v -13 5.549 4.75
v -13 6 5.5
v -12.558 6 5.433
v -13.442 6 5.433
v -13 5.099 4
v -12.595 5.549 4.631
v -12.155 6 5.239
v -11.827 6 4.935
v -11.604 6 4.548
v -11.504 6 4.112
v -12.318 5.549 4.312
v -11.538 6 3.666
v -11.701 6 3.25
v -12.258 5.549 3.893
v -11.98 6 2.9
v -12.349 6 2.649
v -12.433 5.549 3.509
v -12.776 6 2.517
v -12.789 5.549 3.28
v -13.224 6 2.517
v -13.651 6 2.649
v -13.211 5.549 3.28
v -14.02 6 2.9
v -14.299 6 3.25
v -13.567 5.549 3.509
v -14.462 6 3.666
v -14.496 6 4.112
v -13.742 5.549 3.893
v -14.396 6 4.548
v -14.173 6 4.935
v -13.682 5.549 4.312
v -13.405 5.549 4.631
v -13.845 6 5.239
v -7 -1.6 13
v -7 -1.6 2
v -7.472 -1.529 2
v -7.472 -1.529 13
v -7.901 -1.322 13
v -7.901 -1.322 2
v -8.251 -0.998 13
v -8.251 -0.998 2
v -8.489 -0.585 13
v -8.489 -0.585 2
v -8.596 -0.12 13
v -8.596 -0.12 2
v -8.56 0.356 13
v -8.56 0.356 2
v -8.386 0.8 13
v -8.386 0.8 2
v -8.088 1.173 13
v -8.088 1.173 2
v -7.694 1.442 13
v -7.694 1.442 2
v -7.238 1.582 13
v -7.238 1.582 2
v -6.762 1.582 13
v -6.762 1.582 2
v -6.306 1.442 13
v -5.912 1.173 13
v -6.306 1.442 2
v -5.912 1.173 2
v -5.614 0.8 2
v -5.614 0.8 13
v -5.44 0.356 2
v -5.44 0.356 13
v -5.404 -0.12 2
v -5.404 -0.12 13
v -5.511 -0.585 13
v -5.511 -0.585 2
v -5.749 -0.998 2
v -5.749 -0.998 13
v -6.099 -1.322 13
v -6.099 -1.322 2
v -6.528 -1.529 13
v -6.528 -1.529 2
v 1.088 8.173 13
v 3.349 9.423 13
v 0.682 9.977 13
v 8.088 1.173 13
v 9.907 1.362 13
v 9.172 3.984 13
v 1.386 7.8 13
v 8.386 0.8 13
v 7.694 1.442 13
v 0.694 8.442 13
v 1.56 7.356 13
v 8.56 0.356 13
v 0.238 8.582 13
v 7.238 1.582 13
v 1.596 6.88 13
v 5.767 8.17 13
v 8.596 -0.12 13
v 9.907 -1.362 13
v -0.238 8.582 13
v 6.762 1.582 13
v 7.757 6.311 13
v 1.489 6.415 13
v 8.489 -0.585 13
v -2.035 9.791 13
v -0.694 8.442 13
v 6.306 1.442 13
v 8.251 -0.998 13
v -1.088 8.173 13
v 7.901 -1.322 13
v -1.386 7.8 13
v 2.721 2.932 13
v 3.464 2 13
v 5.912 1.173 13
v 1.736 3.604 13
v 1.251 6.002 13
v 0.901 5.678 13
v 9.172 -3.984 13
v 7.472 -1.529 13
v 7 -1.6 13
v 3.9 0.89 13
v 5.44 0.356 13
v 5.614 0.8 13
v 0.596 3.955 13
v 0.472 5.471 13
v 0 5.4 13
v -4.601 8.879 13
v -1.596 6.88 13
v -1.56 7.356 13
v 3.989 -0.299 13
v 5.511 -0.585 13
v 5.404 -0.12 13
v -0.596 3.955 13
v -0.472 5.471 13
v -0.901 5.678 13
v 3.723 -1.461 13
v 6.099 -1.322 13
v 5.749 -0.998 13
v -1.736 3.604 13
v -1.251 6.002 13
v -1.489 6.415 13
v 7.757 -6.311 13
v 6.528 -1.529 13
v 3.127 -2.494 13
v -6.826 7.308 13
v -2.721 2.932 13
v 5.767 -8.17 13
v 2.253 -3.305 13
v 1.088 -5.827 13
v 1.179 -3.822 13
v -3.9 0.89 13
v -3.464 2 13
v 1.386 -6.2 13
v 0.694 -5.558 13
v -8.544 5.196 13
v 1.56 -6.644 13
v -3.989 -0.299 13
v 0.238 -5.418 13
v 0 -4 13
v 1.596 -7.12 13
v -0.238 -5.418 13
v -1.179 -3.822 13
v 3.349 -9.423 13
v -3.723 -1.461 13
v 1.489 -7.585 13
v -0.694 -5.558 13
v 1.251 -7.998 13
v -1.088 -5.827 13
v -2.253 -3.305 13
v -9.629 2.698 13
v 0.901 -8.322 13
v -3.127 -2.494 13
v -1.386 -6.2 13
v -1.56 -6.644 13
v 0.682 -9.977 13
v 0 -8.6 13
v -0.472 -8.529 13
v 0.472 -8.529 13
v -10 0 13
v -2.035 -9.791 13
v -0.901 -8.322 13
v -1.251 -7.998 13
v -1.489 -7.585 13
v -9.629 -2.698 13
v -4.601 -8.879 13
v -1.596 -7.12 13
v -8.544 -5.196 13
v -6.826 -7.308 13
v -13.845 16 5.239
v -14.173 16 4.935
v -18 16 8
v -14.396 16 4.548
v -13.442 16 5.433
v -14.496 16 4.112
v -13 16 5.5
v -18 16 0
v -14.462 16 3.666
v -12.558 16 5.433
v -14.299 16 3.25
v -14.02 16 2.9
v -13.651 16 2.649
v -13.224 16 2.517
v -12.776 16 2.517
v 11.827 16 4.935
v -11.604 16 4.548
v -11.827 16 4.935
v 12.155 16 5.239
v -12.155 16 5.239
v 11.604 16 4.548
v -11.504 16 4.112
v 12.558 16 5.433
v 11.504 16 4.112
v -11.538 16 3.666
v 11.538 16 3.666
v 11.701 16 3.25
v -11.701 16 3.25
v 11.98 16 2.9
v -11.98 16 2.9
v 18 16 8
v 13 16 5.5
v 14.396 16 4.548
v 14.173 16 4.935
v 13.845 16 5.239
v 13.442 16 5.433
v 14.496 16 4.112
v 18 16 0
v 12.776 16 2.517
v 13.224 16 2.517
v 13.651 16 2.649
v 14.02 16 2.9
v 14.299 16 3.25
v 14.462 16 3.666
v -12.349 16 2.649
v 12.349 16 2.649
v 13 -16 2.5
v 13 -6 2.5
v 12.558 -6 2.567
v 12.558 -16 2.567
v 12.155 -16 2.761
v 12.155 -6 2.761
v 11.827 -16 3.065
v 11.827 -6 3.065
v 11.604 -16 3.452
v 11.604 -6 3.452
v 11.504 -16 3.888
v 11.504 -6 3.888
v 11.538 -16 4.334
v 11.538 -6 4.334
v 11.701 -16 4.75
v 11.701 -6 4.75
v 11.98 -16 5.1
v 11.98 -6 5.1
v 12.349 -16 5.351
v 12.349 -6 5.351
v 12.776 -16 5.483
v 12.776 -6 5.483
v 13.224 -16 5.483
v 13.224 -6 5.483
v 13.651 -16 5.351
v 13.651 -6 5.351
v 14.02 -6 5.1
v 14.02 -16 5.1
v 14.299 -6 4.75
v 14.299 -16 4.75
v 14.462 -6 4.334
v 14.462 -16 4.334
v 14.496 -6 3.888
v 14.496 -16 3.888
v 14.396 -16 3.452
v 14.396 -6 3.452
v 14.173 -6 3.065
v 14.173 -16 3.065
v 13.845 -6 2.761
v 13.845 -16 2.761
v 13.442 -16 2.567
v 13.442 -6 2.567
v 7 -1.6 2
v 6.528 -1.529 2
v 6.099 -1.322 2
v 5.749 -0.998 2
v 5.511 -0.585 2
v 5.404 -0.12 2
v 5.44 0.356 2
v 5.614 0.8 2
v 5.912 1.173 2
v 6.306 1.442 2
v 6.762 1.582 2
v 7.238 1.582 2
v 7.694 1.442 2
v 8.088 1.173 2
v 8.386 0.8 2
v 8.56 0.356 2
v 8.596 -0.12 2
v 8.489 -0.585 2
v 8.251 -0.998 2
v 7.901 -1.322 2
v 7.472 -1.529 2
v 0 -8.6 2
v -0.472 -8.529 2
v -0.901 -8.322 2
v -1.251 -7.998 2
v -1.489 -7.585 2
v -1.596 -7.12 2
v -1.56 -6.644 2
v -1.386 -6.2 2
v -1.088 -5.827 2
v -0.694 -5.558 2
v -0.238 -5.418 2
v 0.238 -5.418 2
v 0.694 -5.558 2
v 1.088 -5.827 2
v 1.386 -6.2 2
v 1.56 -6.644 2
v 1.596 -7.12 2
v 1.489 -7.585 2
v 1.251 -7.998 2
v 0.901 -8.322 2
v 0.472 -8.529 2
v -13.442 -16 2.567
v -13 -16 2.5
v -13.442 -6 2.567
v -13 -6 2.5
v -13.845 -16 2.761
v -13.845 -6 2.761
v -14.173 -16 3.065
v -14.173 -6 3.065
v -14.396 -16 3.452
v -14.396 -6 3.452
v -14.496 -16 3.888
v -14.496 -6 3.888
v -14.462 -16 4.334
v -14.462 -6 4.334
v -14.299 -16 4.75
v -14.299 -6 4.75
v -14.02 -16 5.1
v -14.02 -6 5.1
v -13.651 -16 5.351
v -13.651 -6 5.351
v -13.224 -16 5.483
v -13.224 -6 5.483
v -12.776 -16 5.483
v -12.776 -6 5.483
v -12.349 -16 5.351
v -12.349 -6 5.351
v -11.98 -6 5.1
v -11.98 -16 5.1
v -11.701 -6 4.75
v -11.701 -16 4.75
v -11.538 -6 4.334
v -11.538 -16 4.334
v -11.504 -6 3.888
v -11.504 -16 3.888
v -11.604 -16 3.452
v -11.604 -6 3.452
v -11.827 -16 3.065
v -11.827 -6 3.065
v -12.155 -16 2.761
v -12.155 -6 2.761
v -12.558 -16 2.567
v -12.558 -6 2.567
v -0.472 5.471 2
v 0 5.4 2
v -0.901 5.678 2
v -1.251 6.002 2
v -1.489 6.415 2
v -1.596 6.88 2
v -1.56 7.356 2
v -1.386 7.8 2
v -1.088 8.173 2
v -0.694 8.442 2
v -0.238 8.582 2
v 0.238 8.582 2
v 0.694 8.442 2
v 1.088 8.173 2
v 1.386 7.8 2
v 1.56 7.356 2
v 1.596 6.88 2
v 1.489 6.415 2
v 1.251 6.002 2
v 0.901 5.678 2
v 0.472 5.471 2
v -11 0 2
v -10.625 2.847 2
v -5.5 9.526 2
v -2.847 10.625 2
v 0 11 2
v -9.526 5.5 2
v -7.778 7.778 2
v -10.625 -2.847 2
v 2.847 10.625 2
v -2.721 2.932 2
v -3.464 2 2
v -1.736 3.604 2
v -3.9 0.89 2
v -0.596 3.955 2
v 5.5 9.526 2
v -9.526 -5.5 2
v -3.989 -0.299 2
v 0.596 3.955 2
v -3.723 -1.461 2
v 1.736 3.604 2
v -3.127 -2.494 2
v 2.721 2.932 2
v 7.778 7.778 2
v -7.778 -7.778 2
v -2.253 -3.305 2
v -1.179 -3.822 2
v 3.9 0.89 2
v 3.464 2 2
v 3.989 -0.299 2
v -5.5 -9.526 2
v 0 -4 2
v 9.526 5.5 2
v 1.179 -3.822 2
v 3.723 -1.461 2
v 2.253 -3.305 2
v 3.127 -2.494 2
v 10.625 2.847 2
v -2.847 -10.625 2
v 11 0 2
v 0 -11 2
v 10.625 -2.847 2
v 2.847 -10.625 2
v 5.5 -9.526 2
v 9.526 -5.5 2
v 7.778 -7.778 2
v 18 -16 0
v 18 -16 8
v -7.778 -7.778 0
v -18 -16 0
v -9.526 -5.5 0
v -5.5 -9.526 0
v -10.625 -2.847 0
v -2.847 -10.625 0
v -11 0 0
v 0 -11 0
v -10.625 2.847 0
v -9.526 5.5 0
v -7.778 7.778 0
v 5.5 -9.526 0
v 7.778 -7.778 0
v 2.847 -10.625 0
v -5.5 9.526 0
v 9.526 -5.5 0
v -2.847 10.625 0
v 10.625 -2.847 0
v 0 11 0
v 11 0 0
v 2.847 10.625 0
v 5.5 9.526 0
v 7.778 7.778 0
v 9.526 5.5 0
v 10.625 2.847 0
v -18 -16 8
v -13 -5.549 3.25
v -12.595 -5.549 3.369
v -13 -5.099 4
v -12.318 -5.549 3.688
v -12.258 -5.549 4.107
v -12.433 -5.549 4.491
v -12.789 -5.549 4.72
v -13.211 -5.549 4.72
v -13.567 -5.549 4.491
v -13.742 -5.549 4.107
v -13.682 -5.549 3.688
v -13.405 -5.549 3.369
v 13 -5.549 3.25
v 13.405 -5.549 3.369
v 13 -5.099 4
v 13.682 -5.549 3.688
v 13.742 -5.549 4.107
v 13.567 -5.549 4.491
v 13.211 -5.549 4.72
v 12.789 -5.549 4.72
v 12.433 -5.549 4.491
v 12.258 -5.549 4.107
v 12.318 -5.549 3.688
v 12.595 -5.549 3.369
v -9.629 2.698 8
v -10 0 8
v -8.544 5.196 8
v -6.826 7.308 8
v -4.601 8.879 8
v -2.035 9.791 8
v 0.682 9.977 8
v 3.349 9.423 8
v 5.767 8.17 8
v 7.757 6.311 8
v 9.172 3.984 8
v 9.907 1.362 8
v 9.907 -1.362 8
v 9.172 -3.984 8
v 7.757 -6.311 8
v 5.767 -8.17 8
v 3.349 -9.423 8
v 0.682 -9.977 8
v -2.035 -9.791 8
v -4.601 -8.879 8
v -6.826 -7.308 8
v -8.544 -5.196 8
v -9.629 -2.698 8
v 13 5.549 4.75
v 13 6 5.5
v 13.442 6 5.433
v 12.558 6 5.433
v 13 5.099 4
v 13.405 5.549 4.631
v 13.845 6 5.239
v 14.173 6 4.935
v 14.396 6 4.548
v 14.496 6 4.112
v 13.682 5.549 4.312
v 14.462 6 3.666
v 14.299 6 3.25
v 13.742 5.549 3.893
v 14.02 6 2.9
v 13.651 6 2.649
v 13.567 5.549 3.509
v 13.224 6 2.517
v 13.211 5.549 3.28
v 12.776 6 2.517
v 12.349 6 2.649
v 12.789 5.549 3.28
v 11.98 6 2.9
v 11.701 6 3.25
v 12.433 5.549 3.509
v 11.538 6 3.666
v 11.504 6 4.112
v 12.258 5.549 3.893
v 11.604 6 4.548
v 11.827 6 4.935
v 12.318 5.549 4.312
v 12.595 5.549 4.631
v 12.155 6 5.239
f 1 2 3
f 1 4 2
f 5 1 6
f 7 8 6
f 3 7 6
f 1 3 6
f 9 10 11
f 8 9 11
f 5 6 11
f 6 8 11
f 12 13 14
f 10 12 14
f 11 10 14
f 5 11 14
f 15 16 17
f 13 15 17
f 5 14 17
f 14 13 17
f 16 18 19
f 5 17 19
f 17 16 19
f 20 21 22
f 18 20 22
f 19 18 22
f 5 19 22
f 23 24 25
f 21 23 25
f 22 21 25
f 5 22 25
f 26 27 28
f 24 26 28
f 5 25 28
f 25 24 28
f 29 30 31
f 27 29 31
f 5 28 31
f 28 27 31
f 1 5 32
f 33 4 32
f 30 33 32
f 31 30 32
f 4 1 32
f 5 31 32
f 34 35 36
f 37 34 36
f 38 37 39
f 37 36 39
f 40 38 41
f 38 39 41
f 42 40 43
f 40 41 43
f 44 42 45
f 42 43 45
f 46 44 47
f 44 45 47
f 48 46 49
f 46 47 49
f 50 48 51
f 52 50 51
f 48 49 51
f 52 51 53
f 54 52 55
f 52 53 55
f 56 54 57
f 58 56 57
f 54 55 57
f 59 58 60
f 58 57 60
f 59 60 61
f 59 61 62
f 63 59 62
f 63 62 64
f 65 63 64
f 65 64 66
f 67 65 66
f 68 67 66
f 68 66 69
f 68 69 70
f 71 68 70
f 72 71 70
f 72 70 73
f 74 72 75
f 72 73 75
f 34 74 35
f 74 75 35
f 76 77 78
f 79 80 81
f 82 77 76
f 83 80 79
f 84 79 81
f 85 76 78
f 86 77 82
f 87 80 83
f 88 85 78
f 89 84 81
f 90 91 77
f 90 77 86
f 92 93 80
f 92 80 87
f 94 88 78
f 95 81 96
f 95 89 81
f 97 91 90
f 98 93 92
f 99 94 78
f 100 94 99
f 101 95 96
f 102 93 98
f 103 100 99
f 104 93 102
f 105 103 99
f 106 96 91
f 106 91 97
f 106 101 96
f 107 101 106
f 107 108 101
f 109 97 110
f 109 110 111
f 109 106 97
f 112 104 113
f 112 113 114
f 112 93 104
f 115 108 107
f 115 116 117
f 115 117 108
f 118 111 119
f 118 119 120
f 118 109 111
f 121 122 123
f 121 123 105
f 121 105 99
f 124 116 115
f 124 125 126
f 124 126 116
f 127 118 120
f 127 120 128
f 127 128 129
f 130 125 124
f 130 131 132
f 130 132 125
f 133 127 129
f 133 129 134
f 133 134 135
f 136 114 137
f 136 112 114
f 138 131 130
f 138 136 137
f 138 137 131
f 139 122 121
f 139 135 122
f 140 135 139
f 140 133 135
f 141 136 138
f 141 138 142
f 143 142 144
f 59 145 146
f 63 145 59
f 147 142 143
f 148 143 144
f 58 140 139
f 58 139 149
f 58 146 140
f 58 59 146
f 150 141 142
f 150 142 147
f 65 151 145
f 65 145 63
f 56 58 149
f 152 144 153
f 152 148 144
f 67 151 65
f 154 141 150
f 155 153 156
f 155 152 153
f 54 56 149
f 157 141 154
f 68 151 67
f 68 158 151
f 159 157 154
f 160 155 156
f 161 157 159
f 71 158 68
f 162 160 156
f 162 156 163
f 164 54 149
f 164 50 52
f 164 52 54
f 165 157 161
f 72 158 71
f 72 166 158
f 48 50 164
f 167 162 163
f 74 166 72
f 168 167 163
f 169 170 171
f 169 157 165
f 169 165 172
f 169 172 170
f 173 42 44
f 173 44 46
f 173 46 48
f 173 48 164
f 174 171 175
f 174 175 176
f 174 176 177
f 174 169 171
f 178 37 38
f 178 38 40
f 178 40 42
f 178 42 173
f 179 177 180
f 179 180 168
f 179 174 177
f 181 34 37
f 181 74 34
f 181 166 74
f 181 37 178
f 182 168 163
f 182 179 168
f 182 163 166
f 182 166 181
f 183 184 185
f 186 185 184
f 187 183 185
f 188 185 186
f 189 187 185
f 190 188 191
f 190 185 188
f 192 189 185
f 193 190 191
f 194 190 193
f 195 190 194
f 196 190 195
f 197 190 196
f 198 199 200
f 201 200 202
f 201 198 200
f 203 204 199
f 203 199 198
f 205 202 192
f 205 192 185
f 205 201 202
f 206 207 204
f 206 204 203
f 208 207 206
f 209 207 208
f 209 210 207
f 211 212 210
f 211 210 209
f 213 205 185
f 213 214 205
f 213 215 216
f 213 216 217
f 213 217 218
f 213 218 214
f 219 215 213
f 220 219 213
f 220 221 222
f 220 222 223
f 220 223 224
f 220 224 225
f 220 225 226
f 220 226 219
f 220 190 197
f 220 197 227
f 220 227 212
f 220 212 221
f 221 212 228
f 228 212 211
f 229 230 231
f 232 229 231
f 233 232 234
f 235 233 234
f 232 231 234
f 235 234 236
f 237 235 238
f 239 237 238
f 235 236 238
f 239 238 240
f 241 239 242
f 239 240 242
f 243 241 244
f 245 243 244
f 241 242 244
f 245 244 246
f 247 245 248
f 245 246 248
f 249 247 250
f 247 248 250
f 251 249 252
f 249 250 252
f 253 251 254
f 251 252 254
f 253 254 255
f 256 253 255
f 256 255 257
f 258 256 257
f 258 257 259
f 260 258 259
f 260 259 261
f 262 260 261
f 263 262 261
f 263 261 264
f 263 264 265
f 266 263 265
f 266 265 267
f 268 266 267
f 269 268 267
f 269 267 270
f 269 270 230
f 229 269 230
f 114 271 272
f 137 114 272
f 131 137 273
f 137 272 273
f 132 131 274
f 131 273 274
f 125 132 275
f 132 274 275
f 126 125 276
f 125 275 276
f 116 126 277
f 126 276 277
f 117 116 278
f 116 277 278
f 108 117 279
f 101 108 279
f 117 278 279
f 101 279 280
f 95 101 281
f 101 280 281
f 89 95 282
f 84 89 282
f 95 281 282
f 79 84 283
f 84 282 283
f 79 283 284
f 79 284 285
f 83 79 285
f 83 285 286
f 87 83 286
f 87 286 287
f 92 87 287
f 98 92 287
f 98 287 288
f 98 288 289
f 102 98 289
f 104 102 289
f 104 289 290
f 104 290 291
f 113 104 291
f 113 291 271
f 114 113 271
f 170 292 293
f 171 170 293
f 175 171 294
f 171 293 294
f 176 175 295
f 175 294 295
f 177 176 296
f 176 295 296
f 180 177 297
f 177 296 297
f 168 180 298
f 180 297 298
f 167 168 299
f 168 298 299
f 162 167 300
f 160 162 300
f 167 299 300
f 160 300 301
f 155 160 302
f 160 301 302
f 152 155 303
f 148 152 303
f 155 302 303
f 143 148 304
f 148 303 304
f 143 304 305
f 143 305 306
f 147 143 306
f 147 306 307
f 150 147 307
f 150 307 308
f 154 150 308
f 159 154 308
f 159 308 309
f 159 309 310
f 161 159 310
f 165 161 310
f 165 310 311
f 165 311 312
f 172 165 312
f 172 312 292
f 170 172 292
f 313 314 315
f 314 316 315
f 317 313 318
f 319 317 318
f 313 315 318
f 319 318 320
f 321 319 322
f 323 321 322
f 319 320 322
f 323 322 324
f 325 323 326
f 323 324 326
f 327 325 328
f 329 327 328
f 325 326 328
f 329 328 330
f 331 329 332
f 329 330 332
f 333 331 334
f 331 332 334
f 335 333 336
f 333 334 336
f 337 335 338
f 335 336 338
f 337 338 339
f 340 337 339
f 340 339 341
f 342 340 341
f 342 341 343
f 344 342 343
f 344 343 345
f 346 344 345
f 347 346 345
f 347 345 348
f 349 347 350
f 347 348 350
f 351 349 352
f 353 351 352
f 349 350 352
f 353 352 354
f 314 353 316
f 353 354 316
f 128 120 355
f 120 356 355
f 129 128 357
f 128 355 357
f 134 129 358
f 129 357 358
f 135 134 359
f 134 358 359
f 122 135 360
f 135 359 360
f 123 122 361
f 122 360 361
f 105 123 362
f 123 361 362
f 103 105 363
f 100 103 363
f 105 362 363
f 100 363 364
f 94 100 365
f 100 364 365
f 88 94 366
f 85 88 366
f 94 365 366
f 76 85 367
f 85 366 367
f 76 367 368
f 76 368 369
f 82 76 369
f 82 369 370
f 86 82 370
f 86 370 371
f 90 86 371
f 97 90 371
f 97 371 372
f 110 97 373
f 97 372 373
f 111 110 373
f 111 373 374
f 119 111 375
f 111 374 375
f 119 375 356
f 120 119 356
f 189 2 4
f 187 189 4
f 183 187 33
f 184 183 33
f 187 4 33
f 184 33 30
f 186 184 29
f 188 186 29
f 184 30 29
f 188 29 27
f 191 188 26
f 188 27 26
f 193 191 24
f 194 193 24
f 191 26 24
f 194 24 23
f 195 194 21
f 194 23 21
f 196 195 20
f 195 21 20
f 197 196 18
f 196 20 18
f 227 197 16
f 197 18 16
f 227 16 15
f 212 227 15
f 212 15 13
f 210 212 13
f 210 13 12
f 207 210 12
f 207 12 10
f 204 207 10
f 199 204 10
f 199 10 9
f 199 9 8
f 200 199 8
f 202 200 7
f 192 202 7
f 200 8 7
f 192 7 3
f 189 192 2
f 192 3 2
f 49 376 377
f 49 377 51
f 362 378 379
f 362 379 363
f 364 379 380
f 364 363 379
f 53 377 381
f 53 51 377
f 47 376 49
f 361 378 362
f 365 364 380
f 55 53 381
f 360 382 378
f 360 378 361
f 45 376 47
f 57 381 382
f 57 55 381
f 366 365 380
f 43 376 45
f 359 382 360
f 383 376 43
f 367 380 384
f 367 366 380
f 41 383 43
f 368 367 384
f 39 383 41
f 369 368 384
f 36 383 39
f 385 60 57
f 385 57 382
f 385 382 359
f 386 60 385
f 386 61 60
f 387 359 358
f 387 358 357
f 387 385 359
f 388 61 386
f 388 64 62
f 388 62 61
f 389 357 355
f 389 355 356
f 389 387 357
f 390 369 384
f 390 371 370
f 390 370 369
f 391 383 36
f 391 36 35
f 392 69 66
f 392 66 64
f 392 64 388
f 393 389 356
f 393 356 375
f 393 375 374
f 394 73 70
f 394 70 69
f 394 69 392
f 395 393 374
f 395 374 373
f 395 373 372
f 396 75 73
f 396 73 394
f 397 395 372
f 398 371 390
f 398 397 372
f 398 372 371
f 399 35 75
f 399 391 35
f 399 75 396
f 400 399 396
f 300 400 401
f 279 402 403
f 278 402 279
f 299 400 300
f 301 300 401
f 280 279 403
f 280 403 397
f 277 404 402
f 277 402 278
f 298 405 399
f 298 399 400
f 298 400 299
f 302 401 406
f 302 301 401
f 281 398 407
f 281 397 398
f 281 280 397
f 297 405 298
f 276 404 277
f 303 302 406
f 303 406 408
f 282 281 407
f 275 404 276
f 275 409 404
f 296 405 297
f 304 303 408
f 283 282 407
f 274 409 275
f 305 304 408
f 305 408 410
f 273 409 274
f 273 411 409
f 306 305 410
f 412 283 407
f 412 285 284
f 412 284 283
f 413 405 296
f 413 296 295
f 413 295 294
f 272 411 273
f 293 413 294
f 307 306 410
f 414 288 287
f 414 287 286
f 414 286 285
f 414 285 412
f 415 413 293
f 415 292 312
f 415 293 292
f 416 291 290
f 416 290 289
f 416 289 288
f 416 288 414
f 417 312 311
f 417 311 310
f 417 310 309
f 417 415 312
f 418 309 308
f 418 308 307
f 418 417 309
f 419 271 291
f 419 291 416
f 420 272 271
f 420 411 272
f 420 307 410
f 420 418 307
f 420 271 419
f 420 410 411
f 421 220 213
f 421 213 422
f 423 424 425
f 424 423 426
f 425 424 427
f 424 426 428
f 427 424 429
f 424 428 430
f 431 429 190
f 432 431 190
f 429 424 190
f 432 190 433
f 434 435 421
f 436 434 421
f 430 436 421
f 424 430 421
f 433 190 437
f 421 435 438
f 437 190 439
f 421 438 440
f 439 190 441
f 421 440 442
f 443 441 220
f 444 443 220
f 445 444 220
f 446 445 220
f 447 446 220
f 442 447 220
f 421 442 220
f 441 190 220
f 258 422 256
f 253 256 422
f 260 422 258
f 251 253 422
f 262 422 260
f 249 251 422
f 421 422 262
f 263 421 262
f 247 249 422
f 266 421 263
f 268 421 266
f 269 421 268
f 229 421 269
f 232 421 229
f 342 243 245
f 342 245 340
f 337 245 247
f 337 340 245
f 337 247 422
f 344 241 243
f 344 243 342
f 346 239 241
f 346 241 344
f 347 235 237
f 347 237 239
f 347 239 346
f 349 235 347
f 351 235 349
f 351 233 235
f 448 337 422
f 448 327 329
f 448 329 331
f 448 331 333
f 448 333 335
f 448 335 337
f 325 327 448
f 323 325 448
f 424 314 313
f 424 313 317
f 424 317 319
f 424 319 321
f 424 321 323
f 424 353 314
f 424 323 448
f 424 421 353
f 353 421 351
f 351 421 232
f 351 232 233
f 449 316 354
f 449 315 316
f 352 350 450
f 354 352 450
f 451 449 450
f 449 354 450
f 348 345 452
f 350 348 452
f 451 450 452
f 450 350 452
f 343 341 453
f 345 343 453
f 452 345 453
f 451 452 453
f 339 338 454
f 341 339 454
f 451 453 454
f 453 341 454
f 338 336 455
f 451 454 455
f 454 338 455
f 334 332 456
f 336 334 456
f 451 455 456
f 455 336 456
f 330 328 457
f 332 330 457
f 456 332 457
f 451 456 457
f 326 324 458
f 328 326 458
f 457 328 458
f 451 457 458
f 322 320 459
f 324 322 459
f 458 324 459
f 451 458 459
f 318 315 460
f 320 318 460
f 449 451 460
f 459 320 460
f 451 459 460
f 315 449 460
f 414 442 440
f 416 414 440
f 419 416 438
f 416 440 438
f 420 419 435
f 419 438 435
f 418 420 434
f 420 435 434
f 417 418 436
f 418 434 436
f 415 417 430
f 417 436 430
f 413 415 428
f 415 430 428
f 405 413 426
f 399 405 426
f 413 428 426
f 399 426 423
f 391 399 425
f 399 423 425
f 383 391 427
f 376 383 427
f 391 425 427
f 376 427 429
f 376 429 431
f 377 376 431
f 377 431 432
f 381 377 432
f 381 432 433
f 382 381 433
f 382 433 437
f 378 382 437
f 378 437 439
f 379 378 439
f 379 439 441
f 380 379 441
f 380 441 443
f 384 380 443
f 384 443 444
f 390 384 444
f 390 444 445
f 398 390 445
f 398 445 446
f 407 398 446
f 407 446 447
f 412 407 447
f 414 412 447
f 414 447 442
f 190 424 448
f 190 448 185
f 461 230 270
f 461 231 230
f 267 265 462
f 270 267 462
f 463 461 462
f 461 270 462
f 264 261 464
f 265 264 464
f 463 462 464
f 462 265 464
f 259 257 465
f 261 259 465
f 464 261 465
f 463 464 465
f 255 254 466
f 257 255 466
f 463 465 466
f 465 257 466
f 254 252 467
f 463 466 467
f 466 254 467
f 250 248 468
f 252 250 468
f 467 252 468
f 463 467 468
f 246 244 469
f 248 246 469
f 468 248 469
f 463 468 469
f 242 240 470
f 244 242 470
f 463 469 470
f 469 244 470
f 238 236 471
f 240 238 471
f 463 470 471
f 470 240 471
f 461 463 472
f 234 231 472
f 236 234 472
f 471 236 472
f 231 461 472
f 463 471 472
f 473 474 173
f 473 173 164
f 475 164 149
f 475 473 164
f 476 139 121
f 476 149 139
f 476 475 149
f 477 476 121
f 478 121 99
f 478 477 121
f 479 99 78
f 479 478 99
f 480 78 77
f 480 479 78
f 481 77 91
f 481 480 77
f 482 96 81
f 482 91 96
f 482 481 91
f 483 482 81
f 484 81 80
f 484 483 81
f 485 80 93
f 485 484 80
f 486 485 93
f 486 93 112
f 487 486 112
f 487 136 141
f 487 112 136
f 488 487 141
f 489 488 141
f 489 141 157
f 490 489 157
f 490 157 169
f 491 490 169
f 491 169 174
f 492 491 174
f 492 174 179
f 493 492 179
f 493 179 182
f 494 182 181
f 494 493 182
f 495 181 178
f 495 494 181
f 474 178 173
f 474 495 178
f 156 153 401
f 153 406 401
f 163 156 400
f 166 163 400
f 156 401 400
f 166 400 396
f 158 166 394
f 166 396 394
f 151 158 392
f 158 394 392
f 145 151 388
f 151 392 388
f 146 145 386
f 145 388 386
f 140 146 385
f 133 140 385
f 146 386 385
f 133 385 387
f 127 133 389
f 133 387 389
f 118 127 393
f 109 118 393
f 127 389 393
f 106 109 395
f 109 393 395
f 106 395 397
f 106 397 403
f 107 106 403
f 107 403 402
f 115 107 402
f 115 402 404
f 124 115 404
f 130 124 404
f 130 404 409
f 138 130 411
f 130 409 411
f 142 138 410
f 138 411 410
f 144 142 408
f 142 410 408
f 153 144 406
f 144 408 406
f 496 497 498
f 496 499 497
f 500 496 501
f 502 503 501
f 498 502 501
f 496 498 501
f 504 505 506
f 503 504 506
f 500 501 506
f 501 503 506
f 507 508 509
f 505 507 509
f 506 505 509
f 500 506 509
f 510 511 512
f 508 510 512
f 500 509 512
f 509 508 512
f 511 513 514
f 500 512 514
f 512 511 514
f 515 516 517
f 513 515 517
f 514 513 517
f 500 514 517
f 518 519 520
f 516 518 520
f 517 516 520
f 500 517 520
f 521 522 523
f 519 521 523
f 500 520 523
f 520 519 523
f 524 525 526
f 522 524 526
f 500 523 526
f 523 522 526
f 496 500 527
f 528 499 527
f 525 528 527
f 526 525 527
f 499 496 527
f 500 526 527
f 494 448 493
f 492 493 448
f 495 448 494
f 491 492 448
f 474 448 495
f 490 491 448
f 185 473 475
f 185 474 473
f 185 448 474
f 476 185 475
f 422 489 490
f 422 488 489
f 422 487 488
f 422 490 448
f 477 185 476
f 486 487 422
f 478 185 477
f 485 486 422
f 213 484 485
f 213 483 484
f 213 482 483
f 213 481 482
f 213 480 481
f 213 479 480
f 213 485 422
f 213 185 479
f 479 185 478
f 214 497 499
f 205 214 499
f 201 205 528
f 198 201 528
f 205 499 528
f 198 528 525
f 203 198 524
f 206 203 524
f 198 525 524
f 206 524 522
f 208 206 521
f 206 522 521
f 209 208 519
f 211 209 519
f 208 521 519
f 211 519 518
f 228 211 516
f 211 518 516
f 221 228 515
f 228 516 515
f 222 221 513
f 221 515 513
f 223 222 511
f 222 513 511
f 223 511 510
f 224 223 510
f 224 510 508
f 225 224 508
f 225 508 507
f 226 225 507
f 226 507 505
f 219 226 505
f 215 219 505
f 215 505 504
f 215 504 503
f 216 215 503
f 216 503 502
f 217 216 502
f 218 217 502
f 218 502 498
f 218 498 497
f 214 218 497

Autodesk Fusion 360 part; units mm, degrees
sketch "スケッチ2" plane through (0, 0, 0) normal (0, 0, 1) x (1, 0, 0)
  line L0 (-18, 16) -> (18, 16)
  line L1 (18, 16) -> (18, -16)
  line L2 (18, -16) -> (-18, -16)
  line L3 (-18, -16) -> (-18, 16)
  point P0 (18, 0)
  dimension "d8" = 32
  dimension "d9" = 18
  dimension "d10" = 18
extrude "押し出し2" add sketch "スケッチ2" along normal blind 8
sketch "スケッチ3" plane through (0, 0, 8) normal (0, 0, 1) x (-1, 0, 0)
  line L0 (18, 16) -> (-18, 16)
  line L1 (-18, 16) -> (-18, -16)
  line L2 (-18, -16) -> (18, -16)
  line L3 (18, -16) -> (18, 16)
  circle A0 centre (0, 0) radius 10
  dimension "d13" = 20
extrude "押し出し3" add sketch "スケッチ3" along normal blind 5 contours A0
sketch "スケッチ4" plane through (0, 0, 13) normal (0, 0, 1) x (-1, 0, 0)
  circle A0 centre (0, 0) radius 10
  circle A1 centre (0, 0) radius 7
  line L0 (7, 0) -> (-7, 0)
  line L1 (0, -7) -> (0, 7)
  dimension "d16" = 14
hole "穴2" at (-7, 0, 13) at (0, 7, 13) at (7, 0, 13) at (0, -7, 13) direction (0, 0, -1) diameter 3.2 end through all
sketch "スケッチ5" plane through (0, -16, 0) normal (0, -1, 0) x (1, 0, 0)
  line L0 (-18, 0) -> (18, 0)
  line L1 (18, 0) -> (18, 8)
  line L2 (18, 8) -> (-18, 8)
  line L3 (-18, 8) -> (-18, 0)
  line L4 (-13, 4) -> (13, 4)
  dimension "d21" = 5
  dimension "d23" = 4
  dimension "d24" = 5
hole "穴3" at (-13, -16, 4) at (13, -16, 4) direction (0, 1, 0) diameter 3 depth 10 tip angle 118
sketch "スケッチ6" plane through (0, 16, 0) normal (0, 1, 0) x (-1, 0, 0)
  line L0 (-18, 0) -> (18, 0)
  line L1 (18, 0) -> (18, 8)
  line L2 (18, 8) -> (-18, 8)
  line L3 (-18, 8) -> (-18, 0)
  line L4 (-13, 4) -> (13, 4)
  dimension "d28" = 4
  dimension "d29" = 5
  dimension "d30" = 5
hole "穴4" at (13, 16, 4) at (-13, 16, 4) direction (0, -1, 0) diameter 3 depth 10 tip angle 118
thread "ねじ2"
sketch "スケッチ7" plane through (0, 0, 0) normal (0, 0, -1) x (1, 0, 0)
  circle A0 centre (7, 0) radius 1.6
  circle A1 centre (-7, 0) radius 1.6
  circle A2 centre (0, -7) radius 1.6
  circle A3 centre (0, 7) radius 1.6
  line L0 (18, 16) -> (-18, 16)
  line L1 (-18, 16) -> (-18, -16)
  line L2 (-18, -16) -> (18, -16)
  line L3 (18, -16) -> (18, 16)
  circle A4 centre (0, 0) radius 11
  dimension "d34" = 22
extrude "押し出し4" cut sketch "スケッチ7" against normal blind 2 contours A4
hole "穴5" at (0, 0, 13) direction (0, 0, -1) diameter 8 end through all
